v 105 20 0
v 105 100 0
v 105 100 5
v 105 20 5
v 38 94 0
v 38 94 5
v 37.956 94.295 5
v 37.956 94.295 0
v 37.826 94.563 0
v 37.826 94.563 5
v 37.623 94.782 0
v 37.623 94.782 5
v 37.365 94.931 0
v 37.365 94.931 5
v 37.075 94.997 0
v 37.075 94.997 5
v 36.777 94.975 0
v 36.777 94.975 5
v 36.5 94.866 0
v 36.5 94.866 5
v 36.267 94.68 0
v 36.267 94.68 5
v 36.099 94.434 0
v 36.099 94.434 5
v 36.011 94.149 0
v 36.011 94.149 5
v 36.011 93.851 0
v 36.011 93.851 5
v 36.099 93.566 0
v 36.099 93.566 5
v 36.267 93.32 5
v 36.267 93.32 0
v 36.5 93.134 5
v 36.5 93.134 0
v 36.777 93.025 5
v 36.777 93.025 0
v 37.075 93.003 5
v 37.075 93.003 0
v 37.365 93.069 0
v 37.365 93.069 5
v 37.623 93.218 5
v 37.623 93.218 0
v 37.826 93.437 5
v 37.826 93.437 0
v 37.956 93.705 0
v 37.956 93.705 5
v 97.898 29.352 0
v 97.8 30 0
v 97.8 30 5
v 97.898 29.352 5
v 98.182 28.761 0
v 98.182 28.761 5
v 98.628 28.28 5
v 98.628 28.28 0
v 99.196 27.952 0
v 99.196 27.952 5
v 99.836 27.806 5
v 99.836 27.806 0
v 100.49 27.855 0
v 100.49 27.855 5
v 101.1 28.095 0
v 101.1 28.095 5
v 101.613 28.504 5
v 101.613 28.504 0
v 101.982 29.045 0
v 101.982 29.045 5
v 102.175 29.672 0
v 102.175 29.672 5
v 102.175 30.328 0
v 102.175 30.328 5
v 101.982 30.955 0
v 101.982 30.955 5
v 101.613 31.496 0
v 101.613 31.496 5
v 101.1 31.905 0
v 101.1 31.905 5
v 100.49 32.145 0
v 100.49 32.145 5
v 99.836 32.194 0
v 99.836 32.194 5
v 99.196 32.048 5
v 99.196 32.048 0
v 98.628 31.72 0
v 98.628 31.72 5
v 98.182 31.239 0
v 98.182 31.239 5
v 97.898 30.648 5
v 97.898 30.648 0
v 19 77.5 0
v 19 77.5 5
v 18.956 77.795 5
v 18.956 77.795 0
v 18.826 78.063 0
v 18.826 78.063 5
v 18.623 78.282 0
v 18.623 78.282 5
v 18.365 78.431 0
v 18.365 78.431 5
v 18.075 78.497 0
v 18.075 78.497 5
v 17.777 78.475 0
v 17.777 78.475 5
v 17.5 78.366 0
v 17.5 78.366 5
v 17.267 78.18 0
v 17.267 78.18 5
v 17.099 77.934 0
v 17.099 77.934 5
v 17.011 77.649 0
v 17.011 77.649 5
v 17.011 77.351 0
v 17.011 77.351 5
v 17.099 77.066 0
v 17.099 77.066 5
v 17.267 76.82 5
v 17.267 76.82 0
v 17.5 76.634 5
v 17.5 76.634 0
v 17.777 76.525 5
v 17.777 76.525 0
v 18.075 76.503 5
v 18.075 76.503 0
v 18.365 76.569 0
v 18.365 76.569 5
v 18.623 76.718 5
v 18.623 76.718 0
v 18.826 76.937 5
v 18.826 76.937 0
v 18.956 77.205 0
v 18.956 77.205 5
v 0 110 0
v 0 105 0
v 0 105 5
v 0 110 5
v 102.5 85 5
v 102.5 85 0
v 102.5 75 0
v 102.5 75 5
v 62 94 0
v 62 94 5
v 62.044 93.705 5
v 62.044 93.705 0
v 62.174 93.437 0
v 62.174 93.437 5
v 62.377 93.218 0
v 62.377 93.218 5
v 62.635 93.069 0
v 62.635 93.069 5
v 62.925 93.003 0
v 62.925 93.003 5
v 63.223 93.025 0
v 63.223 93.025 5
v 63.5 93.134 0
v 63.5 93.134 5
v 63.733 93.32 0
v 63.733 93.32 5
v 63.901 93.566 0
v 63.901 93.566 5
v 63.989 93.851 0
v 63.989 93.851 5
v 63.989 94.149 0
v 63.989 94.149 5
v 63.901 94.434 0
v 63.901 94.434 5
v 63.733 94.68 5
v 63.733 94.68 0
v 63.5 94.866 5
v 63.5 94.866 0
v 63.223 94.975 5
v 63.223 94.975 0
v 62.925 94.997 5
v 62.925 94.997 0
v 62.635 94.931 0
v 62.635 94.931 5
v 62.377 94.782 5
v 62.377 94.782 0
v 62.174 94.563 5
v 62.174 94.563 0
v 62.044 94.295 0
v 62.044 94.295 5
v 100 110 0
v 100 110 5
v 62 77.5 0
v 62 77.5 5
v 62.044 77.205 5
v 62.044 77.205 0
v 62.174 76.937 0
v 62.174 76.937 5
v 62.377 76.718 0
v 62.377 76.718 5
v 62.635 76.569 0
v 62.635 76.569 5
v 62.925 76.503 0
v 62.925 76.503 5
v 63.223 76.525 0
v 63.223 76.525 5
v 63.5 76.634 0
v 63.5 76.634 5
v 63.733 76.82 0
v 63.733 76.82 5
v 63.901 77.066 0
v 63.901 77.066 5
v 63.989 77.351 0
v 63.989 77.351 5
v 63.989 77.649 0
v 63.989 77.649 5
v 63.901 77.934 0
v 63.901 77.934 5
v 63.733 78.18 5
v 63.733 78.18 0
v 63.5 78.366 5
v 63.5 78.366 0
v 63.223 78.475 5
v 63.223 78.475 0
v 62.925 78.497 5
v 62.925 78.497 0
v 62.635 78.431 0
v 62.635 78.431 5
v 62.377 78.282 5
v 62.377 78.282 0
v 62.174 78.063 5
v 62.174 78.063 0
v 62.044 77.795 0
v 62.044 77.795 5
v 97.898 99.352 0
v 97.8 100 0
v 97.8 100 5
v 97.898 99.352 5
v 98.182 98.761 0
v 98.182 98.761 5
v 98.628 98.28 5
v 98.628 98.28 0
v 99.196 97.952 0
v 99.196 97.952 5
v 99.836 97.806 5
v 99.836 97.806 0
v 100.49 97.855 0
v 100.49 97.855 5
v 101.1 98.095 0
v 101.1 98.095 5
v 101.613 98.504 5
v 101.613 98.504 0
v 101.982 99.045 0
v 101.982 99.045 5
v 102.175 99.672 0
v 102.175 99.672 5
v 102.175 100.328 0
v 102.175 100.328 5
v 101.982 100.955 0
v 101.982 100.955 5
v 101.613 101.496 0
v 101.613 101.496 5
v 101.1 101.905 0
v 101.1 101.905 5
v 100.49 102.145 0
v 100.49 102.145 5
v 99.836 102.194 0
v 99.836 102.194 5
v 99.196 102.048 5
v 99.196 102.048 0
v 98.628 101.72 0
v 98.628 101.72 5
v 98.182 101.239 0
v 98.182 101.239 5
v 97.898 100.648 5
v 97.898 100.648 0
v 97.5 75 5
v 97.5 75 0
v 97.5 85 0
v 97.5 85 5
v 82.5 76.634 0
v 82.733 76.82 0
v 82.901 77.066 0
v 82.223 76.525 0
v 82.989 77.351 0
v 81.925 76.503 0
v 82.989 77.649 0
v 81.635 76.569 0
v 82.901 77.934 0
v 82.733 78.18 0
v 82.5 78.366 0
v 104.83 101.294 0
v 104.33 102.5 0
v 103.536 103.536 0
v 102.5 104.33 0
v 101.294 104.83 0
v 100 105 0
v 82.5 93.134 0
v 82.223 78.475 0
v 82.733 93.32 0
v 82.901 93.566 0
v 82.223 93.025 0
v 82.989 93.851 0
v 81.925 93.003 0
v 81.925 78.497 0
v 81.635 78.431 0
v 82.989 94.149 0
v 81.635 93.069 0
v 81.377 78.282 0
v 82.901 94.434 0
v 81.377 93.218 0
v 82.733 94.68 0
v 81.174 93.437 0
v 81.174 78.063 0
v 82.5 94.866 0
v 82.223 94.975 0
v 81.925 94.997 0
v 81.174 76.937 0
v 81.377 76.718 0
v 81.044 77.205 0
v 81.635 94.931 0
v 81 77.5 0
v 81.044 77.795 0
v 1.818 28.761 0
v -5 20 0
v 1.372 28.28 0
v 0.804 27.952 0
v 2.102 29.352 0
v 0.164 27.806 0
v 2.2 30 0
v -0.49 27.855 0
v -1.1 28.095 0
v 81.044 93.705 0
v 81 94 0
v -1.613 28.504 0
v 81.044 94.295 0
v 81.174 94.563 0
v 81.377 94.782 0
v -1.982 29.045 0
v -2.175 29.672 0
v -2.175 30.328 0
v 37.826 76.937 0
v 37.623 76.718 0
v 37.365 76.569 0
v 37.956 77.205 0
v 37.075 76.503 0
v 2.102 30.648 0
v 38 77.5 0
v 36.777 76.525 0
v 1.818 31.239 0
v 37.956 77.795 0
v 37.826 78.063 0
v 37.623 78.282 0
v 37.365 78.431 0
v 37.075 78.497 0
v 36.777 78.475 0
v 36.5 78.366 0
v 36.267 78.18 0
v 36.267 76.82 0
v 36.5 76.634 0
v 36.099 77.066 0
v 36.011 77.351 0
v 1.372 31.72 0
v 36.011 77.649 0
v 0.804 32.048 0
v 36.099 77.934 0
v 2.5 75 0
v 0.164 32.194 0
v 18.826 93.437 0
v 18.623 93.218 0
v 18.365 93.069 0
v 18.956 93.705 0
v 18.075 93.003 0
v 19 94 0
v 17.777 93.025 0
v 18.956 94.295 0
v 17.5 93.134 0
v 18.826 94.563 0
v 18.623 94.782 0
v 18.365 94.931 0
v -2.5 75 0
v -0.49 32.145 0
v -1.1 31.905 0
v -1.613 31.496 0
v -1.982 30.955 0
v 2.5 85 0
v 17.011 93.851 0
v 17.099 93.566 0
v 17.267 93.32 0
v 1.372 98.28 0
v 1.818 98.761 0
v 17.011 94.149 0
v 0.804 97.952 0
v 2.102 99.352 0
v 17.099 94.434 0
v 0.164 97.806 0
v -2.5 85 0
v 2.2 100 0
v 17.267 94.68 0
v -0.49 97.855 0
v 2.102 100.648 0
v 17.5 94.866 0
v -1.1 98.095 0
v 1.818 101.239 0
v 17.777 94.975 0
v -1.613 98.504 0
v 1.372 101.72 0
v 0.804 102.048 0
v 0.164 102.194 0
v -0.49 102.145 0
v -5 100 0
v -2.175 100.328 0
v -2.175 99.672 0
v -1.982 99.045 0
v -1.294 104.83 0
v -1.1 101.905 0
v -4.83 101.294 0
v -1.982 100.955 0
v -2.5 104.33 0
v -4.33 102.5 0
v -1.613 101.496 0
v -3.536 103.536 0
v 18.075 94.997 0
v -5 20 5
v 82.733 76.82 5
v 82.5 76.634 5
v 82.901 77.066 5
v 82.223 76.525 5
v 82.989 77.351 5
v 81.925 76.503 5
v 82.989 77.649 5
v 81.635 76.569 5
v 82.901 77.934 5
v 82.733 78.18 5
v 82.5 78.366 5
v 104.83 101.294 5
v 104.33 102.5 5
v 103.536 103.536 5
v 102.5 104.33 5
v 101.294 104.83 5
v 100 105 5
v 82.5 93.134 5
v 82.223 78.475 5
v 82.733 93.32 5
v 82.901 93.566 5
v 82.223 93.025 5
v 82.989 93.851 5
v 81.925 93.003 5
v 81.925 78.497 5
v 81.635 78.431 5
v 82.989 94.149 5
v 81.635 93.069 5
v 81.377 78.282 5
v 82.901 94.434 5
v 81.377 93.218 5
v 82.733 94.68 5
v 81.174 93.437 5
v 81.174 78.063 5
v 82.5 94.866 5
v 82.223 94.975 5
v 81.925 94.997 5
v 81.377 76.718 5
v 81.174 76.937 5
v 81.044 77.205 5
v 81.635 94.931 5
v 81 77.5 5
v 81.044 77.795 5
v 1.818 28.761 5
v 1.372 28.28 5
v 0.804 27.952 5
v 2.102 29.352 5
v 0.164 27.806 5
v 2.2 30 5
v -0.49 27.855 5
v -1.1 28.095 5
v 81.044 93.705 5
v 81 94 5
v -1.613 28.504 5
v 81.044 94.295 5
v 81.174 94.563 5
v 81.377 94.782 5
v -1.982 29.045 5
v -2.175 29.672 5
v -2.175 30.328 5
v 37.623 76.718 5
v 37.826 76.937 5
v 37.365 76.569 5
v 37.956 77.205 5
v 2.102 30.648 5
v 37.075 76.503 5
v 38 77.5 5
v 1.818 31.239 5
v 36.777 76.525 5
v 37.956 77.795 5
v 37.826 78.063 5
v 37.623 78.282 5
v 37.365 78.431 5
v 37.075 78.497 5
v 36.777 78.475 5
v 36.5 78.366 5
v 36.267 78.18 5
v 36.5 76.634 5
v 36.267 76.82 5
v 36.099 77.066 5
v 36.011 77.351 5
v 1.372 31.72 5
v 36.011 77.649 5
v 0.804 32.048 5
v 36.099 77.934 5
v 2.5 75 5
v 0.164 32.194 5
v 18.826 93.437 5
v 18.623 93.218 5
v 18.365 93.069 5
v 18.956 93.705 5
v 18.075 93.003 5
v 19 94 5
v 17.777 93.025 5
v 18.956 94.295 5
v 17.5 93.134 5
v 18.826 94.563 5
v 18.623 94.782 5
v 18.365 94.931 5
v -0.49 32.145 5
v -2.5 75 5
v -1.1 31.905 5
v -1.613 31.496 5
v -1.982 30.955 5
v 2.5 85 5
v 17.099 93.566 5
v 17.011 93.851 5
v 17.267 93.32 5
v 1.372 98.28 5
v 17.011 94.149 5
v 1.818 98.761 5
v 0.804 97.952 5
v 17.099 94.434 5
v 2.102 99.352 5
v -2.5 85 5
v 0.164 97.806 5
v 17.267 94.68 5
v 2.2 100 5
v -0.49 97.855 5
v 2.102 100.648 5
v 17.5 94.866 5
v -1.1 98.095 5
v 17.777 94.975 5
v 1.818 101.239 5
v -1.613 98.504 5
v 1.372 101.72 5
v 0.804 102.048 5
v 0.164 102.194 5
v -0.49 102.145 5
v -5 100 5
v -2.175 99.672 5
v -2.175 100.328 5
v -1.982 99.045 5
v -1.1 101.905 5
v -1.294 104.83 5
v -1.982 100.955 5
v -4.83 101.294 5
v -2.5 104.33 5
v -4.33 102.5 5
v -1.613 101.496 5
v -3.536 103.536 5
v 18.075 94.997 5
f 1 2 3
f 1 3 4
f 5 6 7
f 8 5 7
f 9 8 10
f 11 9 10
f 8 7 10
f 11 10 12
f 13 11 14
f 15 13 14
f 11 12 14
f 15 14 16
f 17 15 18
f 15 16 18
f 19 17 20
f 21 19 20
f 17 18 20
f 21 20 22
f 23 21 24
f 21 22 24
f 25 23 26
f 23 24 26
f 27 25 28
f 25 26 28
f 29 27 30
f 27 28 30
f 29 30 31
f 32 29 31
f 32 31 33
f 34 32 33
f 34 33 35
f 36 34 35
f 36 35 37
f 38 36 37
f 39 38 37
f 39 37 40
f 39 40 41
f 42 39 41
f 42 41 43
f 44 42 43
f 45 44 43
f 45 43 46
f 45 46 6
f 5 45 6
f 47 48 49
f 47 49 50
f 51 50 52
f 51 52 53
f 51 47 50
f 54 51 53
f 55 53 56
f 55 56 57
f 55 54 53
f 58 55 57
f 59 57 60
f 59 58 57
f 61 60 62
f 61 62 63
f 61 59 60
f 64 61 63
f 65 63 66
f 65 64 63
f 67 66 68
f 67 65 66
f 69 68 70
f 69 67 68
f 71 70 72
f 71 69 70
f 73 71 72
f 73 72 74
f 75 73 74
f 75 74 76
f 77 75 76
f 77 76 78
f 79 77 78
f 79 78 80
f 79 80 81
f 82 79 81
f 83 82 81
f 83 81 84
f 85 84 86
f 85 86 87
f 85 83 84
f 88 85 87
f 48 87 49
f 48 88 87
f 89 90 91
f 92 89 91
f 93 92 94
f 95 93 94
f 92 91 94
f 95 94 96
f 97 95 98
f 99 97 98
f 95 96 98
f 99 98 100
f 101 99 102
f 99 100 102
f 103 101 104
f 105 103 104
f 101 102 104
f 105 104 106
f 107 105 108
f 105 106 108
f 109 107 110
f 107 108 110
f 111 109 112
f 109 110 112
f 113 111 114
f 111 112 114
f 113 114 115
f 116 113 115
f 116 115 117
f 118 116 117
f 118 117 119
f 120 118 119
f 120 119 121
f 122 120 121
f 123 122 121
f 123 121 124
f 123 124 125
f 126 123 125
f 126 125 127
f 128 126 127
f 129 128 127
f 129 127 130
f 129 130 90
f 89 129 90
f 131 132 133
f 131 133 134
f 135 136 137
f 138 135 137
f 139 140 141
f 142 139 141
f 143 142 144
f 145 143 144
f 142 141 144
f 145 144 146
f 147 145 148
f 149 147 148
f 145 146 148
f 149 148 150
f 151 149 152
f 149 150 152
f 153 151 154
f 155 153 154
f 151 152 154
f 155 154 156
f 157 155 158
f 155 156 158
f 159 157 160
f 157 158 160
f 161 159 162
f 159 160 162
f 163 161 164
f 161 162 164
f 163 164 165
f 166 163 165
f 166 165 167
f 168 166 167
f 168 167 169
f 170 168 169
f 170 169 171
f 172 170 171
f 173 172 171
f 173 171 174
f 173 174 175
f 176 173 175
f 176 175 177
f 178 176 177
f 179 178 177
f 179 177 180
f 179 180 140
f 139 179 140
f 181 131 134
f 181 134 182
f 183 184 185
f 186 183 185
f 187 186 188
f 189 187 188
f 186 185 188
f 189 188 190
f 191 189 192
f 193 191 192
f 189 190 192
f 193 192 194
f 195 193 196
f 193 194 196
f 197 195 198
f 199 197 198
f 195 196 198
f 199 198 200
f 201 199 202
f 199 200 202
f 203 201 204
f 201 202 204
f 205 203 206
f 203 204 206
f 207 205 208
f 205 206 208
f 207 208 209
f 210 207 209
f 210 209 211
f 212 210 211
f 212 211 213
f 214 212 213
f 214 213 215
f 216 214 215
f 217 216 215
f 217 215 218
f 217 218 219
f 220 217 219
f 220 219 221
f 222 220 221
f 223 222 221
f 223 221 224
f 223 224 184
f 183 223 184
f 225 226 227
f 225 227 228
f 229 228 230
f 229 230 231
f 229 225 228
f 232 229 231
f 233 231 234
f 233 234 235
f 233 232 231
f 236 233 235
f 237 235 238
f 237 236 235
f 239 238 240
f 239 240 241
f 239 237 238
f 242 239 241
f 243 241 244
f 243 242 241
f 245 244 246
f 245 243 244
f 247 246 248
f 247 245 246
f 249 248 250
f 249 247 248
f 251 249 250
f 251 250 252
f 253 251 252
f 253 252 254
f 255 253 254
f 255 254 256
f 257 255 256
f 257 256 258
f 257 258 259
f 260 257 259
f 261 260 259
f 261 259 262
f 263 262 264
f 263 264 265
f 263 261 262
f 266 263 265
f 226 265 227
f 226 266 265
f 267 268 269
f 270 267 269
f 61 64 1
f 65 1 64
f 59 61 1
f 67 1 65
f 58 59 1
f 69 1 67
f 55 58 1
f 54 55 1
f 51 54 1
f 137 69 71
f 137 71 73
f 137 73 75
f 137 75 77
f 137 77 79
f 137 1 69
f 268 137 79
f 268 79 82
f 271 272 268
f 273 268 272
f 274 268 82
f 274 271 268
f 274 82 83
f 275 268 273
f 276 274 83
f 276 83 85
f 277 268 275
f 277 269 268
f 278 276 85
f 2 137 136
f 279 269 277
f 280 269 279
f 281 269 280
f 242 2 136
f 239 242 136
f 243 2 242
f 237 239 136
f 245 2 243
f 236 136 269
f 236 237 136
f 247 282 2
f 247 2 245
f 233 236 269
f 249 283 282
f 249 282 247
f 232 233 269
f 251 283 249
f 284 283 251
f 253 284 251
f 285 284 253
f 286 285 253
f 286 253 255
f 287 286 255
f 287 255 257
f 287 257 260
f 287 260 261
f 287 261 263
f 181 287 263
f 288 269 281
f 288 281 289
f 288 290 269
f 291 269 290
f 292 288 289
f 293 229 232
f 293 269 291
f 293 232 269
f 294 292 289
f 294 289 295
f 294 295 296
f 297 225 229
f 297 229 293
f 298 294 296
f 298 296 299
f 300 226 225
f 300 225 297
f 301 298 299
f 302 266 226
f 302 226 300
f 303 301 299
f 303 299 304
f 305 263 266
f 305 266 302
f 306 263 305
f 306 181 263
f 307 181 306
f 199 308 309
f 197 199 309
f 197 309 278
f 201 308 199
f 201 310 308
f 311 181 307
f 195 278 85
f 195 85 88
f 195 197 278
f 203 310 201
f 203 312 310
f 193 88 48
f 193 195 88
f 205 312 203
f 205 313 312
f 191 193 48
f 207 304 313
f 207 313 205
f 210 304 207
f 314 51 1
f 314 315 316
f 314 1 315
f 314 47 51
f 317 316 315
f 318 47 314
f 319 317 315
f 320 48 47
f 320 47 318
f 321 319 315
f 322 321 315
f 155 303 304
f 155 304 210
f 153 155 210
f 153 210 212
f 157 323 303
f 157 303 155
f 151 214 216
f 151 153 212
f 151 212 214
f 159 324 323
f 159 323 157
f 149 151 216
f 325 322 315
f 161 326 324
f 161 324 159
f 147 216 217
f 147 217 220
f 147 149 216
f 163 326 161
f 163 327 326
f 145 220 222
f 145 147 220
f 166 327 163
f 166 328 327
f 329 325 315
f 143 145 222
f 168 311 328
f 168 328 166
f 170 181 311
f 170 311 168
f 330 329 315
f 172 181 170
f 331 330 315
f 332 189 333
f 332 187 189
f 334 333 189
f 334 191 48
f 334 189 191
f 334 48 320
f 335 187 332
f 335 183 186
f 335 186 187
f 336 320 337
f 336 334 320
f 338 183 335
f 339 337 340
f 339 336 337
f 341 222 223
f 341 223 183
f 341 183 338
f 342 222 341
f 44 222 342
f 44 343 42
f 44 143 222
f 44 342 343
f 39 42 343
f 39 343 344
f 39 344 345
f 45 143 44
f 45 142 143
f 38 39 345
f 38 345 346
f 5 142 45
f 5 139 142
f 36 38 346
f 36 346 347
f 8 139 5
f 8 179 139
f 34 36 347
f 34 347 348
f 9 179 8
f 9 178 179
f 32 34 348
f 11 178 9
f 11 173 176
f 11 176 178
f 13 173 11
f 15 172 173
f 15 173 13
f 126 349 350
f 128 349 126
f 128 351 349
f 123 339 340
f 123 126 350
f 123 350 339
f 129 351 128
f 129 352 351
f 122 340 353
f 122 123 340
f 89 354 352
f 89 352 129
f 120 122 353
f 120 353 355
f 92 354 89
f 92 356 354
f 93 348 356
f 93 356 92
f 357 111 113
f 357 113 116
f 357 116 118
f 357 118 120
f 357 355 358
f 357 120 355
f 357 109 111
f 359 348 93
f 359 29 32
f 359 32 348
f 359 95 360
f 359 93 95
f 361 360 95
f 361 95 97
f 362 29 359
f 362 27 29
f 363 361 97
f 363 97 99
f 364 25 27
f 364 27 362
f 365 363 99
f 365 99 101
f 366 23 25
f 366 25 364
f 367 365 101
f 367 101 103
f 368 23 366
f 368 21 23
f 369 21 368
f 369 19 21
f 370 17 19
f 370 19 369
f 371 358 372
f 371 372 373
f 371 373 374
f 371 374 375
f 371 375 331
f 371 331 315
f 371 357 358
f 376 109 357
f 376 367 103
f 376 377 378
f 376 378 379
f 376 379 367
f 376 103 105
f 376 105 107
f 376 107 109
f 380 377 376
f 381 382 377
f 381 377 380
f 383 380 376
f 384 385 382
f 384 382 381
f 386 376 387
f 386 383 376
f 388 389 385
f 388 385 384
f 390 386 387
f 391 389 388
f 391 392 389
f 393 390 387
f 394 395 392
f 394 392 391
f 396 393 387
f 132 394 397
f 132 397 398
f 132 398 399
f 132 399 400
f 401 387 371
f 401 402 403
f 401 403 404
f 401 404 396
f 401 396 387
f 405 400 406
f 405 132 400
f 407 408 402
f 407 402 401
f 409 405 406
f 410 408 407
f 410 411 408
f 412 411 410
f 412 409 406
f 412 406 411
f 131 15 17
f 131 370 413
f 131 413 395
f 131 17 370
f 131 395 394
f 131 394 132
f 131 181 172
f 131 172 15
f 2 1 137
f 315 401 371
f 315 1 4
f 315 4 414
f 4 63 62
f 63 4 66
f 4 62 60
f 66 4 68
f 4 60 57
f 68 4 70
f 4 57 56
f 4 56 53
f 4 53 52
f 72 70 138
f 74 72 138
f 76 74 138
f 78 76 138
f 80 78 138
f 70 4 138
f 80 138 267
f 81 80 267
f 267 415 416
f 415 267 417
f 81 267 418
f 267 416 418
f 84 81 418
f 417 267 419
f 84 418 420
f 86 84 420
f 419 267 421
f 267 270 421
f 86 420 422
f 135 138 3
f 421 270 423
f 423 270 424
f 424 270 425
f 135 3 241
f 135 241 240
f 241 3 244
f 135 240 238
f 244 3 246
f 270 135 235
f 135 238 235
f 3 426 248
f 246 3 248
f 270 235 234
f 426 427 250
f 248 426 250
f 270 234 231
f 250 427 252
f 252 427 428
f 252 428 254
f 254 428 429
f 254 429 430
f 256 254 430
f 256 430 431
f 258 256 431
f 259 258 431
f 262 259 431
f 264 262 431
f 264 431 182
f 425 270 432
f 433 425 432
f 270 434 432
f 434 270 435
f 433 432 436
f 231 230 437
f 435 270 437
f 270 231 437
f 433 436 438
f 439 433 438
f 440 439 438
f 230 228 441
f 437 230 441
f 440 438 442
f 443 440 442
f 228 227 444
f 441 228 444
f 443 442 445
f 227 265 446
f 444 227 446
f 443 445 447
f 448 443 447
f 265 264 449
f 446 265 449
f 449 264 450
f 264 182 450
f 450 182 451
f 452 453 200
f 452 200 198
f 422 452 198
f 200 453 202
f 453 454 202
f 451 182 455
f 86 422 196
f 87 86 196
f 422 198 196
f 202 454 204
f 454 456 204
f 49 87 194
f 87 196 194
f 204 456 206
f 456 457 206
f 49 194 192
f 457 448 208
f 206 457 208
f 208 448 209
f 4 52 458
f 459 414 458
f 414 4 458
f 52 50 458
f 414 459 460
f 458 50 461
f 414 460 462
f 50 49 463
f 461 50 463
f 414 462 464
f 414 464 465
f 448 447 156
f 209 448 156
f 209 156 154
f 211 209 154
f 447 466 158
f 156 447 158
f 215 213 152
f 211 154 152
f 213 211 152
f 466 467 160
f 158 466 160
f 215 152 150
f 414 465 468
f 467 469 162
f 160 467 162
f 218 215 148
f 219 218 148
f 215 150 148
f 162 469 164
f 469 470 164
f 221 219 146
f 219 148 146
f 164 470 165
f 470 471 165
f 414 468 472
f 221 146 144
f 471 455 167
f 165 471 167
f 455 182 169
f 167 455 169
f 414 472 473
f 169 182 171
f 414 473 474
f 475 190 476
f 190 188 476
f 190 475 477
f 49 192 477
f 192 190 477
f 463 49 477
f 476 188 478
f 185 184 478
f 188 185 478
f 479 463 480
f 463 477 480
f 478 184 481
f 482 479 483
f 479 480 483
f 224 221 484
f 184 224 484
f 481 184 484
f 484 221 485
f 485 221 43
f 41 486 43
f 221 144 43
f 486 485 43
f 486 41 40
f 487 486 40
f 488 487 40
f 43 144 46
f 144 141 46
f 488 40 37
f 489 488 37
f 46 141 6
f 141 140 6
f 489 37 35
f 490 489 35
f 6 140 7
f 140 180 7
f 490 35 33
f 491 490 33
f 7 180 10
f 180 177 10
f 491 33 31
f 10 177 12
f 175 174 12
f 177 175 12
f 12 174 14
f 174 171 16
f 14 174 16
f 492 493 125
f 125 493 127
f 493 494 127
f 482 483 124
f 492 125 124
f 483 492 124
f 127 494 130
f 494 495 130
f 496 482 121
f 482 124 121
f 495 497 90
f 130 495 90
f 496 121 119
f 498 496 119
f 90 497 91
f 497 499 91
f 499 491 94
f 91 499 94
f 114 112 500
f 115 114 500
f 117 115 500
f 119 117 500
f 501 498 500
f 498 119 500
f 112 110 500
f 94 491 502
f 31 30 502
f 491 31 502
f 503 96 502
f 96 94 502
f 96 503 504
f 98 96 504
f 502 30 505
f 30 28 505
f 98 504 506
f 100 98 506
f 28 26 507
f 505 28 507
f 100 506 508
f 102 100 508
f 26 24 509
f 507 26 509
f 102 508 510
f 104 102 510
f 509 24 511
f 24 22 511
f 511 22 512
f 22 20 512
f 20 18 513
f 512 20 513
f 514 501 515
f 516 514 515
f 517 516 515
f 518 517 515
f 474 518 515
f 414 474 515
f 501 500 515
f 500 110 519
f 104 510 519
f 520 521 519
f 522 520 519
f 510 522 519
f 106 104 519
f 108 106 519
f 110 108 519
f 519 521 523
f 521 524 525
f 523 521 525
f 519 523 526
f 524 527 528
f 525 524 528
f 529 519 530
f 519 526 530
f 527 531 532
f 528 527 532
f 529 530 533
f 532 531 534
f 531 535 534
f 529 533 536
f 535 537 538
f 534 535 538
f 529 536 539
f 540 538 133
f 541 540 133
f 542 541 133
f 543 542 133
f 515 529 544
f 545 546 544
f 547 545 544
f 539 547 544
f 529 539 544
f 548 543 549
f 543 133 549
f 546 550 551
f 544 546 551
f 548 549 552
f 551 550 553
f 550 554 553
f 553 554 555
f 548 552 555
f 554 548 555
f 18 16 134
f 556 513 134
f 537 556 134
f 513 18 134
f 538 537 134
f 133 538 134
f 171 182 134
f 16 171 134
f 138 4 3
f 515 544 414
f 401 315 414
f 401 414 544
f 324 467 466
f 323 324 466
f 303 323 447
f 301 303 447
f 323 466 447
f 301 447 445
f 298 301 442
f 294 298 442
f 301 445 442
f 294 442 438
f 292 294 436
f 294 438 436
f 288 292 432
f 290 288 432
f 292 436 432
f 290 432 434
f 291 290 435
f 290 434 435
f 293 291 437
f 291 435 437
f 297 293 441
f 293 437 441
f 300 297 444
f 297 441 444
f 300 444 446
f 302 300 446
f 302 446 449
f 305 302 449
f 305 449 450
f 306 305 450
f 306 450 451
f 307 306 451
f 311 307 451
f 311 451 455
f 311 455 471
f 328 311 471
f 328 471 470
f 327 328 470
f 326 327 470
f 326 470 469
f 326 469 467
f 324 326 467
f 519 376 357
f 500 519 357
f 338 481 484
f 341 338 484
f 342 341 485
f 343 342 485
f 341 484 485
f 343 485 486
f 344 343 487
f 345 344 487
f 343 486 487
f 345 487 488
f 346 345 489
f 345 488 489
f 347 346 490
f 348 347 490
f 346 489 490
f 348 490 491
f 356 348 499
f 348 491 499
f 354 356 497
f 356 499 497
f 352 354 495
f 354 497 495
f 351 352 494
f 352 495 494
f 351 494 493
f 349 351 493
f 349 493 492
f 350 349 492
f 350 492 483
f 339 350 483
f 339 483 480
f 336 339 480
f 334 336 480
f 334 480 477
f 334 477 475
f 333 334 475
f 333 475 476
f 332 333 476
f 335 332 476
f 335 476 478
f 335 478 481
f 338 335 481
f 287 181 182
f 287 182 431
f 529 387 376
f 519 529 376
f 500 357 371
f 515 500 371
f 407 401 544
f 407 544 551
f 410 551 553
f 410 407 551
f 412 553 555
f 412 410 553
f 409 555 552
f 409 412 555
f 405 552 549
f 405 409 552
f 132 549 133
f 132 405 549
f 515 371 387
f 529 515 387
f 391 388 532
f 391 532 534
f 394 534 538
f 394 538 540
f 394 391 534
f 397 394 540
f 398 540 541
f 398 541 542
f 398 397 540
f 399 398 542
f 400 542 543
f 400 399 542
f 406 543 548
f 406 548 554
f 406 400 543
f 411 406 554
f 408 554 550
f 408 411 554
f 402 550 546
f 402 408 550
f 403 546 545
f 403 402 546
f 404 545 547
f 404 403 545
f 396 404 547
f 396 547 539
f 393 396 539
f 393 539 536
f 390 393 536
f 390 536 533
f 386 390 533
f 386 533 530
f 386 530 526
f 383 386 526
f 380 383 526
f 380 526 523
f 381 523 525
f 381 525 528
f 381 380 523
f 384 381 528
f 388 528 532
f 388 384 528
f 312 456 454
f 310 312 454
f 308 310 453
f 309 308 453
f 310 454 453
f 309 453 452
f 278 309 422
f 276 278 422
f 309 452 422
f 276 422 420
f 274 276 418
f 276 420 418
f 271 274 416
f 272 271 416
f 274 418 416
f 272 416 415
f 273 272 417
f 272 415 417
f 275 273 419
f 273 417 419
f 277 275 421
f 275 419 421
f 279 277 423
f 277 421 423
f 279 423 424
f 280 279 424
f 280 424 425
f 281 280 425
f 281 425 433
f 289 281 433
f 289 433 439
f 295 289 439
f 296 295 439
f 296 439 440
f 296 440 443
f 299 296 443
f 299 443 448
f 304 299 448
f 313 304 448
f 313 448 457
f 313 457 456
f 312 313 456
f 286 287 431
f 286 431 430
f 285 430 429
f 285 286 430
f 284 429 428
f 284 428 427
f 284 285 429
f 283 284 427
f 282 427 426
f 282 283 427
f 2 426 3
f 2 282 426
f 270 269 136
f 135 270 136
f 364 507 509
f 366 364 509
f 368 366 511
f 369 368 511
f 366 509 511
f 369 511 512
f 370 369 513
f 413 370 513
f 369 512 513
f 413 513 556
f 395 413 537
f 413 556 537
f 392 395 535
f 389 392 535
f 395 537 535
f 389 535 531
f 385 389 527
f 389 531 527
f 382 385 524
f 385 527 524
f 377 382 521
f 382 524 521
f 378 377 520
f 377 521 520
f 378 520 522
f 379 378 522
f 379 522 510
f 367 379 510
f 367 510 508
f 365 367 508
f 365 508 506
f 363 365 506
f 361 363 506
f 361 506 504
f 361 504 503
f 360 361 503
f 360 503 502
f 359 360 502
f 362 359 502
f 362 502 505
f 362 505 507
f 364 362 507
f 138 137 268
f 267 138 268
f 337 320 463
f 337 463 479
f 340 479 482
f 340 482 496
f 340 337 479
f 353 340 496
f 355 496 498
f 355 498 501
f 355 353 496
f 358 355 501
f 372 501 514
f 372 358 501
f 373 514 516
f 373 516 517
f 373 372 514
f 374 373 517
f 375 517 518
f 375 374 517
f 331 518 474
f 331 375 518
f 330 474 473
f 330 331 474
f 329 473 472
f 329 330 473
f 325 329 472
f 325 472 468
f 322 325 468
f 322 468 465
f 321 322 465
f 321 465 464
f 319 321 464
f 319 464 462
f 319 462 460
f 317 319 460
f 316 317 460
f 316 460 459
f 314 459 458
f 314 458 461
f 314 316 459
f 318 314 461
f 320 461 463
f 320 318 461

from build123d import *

# Parameters (mm, degrees)
SKETCH1_R           = 2.2
BOSS_EXTRUDE1_DEPTH = 5
SKETCH2_R           = 1
CUT_EXTRUDE1_DEPTH  = 153.151240547


with BuildPart() as part:
    # Sketch1 → Boss-Extrude1 (new body)
    with BuildSketch(Plane.XY):
        with BuildLine():
            Line((0, 105), (0, 110))
            Line((0, 110), (100, 110))
            Line((100, 110), (100, 105))
            ThreePointArc((100, 105), (103.535533906, 103.535533906), (105, 100))
            Line((105, 100), (105, 20))
            Line((105, 20), (100, 20))
            Line((100, 20), (0, 20))
            Line((0, 20), (-5, 20))
            Line((-5, 20), (-5, 100))
            ThreePointArc((-5, 100), (-3.535533906, 103.535533906), (0, 105))
        make_face()
        with Locations((0, 100)):
            Circle(SKETCH1_R, mode=Mode.SUBTRACT)
        with Locations((0, 30)):
            Circle(SKETCH1_R, mode=Mode.SUBTRACT)
        with Locations(Location((100, 30, 0), (0, 0, 180))):
            Circle(SKETCH1_R, mode=Mode.SUBTRACT)
        with Locations(Location((100, 100, 0), (0, 0, 180))):
            Circle(SKETCH1_R, mode=Mode.SUBTRACT)
        Polygon((0, 85), (2.5, 85), (2.5, 75), (0, 75), (-2.5, 75), (-2.5, 85), align=None, mode=Mode.SUBTRACT)
        Polygon((102.5, 75), (100, 75), (97.5, 75), (97.5, 85), (100, 85), (102.5, 85), align=None, mode=Mode.SUBTRACT)
    extrude(amount=BOSS_EXTRUDE1_DEPTH)

    # Sketch2 → Cut-Extrude1 (cut, through all)
    with BuildSketch(Plane.XY.offset(5)):
        with Locations((18, 94)):
            Circle(SKETCH2_R)
        with Locations((37, 94)):
            Circle(SKETCH2_R)
        with Locations((18, 77.5)):
            Circle(SKETCH2_R)
        with Locations((37, 77.5)):
            Circle(SKETCH2_R)
        with Locations(Location((63, 77.5, 0), (0, 0, 180))):
            Circle(SKETCH2_R)
        with Locations(Location((82, 77.5, 0), (0, 0, 180))):
            Circle(SKETCH2_R)
        with Locations(Location((63, 94, 0), (0, 0, 180))):
            Circle(SKETCH2_R)
        with Locations(Location((82, 94, 0), (0, 0, 180))):
            Circle(SKETCH2_R)
    extrude(amount=-CUT_EXTRUDE1_DEPTH, mode=Mode.SUBTRACT)


solid = part.part
